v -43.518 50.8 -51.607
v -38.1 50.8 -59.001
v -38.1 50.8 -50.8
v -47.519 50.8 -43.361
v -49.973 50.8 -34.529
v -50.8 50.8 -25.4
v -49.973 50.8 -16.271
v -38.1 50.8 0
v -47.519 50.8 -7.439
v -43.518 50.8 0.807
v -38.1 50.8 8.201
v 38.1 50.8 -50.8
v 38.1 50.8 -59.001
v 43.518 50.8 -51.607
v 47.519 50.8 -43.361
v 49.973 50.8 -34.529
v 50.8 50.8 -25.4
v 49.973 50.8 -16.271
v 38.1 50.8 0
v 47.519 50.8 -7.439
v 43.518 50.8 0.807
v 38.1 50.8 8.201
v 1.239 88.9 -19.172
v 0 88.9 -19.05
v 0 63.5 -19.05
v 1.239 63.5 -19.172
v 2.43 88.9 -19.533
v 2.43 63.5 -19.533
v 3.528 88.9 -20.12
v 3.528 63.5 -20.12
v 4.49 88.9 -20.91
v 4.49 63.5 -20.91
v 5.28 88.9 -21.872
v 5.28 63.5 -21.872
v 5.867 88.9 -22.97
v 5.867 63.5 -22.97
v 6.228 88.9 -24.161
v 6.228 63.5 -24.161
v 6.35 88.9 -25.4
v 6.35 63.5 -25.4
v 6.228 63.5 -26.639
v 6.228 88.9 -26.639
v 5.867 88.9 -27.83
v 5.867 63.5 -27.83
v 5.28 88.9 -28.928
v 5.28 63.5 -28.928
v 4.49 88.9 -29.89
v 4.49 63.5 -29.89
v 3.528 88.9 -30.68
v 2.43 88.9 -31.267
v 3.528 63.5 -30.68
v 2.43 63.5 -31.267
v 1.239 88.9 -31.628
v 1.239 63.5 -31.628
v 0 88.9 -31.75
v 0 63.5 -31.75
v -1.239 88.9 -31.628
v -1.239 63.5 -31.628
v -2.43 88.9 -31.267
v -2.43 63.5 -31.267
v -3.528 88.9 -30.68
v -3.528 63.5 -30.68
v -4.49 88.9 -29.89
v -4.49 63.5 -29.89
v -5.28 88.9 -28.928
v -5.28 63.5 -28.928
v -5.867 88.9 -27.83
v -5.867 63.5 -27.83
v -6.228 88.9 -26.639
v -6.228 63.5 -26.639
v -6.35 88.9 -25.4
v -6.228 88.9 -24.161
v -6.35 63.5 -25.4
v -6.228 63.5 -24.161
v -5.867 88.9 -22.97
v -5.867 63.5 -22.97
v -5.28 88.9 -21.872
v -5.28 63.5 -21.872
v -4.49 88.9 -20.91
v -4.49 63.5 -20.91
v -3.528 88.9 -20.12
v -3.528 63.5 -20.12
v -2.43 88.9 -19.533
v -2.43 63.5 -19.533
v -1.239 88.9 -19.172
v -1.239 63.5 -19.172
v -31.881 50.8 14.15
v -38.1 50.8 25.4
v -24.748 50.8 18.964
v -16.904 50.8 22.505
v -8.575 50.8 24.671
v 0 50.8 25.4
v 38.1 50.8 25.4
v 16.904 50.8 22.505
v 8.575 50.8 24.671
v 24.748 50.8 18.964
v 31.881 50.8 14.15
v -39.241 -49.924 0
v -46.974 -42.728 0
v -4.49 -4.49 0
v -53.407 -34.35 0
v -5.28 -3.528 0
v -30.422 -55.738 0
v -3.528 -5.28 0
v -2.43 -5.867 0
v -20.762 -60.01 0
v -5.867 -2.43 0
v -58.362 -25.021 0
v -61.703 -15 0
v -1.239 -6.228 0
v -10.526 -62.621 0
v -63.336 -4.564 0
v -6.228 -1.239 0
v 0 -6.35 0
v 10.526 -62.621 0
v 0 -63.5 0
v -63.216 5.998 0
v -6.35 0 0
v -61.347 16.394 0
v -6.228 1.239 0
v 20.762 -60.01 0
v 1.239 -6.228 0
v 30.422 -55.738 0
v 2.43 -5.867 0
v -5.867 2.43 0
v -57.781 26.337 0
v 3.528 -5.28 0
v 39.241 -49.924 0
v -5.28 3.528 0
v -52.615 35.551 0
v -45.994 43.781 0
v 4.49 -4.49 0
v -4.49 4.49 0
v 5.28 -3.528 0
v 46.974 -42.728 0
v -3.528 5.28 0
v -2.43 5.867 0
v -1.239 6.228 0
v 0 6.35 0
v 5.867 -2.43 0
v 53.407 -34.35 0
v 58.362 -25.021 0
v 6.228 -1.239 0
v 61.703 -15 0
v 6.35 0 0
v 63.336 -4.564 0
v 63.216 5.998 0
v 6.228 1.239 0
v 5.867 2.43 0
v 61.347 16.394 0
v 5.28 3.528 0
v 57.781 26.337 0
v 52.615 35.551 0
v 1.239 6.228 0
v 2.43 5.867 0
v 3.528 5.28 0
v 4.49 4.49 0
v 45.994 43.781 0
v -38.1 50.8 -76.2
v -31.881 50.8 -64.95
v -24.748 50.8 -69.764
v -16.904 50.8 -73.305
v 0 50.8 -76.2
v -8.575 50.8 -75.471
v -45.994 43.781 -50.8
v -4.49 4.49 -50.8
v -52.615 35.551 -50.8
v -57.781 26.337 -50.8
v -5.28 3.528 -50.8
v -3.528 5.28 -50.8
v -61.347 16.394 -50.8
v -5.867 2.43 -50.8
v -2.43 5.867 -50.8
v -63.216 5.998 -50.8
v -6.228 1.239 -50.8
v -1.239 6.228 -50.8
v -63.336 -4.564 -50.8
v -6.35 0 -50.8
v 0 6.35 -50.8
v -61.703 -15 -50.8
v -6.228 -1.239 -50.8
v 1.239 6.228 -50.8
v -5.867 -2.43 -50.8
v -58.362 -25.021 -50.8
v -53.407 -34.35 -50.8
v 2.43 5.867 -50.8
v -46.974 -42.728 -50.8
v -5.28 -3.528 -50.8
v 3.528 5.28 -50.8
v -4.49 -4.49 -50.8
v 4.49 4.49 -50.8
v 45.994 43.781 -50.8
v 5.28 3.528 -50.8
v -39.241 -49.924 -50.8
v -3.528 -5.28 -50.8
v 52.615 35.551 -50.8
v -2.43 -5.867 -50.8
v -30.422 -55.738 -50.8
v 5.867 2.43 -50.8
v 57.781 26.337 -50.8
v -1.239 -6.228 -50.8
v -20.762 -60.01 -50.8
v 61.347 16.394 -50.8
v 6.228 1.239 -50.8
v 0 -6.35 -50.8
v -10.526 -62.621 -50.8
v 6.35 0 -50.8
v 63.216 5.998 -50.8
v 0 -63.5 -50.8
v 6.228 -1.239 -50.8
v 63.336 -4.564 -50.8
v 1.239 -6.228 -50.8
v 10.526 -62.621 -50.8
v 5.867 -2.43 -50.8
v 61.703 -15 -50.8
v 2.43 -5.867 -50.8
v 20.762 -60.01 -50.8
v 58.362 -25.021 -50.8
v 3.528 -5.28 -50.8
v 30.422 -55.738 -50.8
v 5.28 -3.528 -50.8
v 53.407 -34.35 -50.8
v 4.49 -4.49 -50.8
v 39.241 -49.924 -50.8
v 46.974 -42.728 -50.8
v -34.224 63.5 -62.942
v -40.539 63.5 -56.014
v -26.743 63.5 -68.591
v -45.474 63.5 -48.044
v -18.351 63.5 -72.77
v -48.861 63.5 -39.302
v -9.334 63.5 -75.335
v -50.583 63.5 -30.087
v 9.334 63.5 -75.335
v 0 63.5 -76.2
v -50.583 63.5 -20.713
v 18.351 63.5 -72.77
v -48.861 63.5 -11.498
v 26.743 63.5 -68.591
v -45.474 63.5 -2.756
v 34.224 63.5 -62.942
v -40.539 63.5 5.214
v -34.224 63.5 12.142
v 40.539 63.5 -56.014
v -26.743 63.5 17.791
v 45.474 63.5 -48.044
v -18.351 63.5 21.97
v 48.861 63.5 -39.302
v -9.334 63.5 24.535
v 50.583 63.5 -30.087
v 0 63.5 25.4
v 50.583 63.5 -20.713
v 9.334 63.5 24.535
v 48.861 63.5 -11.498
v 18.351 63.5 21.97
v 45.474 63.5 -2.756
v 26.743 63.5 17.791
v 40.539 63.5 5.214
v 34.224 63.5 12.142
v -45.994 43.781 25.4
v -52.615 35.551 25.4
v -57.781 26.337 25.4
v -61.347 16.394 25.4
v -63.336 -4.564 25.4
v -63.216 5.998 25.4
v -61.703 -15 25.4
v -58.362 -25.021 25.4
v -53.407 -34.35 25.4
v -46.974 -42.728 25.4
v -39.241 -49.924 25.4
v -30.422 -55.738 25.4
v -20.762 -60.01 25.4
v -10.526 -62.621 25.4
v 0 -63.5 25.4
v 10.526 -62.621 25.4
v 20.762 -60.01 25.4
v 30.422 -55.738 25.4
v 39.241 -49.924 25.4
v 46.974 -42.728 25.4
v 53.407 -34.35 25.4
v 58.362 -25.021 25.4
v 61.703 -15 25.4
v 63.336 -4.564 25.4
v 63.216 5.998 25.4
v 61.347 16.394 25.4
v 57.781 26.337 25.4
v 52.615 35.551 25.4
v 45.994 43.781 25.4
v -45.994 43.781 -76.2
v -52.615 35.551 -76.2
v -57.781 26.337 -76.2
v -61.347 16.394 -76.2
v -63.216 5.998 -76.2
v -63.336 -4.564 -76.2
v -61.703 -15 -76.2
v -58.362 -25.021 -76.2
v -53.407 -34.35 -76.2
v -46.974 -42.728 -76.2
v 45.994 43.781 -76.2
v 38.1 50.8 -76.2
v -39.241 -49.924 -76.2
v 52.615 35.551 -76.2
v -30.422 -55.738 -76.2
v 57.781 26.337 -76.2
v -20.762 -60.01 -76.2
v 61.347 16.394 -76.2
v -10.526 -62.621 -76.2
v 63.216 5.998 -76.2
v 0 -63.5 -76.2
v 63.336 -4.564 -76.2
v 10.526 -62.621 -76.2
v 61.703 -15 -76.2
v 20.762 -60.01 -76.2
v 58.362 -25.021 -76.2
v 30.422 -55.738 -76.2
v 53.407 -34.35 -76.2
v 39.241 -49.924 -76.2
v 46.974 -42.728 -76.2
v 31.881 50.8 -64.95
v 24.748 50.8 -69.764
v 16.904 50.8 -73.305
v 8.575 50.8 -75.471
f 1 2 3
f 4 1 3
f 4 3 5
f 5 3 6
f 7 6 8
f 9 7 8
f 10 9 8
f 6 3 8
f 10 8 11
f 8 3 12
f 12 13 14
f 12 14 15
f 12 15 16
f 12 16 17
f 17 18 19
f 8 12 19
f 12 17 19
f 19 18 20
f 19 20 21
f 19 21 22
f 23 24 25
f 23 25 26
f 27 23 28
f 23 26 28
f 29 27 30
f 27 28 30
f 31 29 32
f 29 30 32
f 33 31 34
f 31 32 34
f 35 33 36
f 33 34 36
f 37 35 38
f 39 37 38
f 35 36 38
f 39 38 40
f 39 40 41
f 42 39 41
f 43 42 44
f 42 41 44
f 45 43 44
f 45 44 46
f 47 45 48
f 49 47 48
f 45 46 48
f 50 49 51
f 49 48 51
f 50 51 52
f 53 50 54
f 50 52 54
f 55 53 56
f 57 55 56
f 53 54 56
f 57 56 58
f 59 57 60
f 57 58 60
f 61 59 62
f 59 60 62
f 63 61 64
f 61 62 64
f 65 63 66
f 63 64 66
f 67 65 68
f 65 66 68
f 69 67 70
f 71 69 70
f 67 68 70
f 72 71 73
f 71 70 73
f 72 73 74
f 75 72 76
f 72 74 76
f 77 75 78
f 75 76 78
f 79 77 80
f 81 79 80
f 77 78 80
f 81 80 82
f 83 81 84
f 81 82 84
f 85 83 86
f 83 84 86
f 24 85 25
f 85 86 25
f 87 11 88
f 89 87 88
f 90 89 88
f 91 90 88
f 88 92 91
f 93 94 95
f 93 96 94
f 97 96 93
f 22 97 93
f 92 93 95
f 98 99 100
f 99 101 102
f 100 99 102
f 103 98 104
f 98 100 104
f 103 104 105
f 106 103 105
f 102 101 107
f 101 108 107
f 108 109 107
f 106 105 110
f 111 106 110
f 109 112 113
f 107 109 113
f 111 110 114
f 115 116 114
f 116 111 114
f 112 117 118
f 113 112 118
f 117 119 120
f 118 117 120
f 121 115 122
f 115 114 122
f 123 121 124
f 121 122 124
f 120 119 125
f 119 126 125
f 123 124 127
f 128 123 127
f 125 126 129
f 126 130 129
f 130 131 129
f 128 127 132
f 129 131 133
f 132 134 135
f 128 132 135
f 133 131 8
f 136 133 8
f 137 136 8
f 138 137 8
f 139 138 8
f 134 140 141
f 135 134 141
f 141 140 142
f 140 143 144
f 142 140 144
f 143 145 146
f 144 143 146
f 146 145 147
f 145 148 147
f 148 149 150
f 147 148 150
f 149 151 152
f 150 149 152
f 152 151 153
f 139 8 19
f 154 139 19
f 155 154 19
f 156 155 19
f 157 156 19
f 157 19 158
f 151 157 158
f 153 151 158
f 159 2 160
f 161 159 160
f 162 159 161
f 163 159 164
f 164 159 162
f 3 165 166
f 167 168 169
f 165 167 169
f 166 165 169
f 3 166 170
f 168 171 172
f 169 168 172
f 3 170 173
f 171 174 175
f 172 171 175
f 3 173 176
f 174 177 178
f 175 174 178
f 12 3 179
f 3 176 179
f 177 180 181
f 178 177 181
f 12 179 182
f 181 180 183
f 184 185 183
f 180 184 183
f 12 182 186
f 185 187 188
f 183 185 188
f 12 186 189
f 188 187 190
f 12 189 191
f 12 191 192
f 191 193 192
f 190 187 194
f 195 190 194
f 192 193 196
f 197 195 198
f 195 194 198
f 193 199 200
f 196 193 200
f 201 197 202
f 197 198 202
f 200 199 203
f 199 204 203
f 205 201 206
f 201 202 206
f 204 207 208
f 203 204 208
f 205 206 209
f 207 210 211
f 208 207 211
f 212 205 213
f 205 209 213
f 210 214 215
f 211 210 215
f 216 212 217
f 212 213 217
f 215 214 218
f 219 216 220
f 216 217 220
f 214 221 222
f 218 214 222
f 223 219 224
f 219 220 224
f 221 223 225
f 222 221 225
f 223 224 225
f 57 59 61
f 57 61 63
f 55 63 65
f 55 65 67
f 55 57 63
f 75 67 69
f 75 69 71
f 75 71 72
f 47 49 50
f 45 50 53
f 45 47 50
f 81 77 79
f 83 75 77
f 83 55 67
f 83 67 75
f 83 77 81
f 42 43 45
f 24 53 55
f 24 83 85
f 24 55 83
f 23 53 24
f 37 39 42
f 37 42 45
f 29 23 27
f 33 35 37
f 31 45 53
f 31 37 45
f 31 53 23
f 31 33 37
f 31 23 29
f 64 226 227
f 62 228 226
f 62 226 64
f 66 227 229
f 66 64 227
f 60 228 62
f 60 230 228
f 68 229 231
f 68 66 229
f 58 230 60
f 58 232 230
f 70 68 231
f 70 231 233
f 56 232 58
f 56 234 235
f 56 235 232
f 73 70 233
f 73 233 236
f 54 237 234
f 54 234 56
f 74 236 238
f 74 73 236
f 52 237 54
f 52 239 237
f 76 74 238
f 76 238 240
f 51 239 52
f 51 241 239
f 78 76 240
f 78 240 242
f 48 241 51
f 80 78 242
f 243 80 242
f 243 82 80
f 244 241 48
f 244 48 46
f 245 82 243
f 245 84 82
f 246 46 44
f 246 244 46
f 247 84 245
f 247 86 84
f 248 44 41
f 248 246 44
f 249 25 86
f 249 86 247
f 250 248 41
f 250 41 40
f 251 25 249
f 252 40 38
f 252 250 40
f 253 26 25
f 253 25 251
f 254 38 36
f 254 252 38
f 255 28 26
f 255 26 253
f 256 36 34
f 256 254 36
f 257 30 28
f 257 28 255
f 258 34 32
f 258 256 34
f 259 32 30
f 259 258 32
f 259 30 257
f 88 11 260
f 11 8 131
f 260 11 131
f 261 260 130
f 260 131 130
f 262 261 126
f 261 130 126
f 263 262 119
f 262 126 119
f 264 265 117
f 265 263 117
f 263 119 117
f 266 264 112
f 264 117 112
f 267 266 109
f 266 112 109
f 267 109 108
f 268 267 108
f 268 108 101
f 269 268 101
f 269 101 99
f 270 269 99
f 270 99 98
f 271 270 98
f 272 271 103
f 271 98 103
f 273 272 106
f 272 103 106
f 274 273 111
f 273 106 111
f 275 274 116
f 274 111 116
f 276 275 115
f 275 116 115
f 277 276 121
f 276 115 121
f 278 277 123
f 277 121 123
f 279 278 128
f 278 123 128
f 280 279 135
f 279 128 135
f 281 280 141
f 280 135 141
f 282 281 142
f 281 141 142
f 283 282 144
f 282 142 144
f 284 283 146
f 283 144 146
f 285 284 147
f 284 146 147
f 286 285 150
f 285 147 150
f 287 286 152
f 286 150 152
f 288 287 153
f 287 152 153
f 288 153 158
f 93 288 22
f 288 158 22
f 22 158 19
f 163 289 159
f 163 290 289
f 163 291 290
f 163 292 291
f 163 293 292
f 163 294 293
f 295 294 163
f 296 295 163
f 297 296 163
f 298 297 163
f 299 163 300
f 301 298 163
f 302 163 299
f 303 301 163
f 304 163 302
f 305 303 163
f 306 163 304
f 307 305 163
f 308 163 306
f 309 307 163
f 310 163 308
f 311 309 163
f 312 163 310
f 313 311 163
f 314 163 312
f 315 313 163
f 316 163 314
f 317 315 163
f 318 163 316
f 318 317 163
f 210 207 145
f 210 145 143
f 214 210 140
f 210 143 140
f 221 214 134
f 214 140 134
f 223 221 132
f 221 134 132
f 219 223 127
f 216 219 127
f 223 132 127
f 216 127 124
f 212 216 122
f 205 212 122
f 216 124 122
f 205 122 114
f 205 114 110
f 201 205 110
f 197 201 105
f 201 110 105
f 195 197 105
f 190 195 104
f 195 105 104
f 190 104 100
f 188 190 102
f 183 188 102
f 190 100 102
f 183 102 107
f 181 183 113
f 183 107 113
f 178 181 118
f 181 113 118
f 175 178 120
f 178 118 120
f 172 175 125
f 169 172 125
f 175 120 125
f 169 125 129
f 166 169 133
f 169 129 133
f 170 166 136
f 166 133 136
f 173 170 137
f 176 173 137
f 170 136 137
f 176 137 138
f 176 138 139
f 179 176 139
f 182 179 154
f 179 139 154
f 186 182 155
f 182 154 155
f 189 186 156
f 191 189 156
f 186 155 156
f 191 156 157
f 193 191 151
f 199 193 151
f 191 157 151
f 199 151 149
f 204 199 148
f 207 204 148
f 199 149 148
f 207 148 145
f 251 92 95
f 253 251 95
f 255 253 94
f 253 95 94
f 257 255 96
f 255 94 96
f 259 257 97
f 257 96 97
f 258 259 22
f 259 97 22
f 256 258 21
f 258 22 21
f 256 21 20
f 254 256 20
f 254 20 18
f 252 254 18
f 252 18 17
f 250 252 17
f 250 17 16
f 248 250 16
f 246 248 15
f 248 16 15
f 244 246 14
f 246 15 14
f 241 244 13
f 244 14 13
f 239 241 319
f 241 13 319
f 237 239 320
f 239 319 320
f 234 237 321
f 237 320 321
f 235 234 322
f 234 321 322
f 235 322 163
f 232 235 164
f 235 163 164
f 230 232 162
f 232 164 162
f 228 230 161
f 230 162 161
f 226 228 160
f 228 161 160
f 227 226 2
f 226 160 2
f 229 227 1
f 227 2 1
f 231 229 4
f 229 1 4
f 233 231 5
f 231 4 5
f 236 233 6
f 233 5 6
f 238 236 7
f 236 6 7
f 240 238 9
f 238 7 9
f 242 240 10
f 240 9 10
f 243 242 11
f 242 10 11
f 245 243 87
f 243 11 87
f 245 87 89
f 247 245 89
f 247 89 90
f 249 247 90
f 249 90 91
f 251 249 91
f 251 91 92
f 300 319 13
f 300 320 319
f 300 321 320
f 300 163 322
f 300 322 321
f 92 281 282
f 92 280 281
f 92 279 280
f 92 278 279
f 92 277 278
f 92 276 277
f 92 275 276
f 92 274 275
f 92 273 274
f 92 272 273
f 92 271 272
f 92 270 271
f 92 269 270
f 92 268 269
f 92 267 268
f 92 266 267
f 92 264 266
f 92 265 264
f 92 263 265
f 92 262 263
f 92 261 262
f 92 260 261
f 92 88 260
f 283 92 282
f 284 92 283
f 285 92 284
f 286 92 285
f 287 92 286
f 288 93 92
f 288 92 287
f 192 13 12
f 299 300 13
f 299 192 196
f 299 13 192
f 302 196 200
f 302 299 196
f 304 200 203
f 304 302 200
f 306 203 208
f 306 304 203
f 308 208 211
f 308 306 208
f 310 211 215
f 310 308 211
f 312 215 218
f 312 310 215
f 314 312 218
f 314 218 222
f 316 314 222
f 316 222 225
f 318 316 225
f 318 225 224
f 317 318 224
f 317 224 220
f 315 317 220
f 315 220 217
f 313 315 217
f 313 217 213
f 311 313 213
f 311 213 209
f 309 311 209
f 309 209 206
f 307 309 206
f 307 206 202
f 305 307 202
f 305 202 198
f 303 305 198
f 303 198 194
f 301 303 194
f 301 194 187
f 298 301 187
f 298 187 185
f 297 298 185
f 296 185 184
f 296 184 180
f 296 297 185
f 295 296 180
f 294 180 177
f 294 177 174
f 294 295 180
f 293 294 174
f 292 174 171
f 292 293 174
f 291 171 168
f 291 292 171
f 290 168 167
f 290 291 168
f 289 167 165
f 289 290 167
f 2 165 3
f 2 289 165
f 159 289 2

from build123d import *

# Parameters (mm, degrees)
SKETCH1_R           = 63.5
BOSS_EXTRUDE2_DEPTH = 25.4
SKETCH2_R           = 6.35
BOSS_EXTRUDE3_DEPTH = 50.8
BOSS_EXTRUDE4_START = 25.4
SKETCH3_R           = 63.5
BOSS_EXTRUDE4_DEPTH = 25.4
CUT_EXTRUDE2_START  = 50.8
SKETCH4_W           = 127
SKETCH4_H           = 101.6
CUT_EXTRUDE2_DEPTH  = 76.2
SKETCH5_R           = 50.8
BOSS_EXTRUDE5_DEPTH = 12.7
SKETCH6_R           = 6.35
BOSS_EXTRUDE6_DEPTH = 25.4


with BuildPart() as part:
    # Sketch1 → Boss-Extrude2 (new body)
    with BuildSketch(Plane.XY):
        Circle(SKETCH1_R)
    extrude(amount=BOSS_EXTRUDE2_DEPTH)

    # Sketch2 → Boss-Extrude3 (add)
    with BuildSketch(Plane(origin=(0, 0, 0), x_dir=(-1, 0, 0), z_dir=(0, 0, -1))):
        with Locations(Location((0, 0, 0), (0, 0, 180))):
            Circle(SKETCH2_R)
    extrude(amount=BOSS_EXTRUDE3_DEPTH)

    # Sketch3 → Boss-Extrude4 (add)
    with BuildSketch(Plane(origin=(0, 0, -50.8), x_dir=(-1, 0, 0), z_dir=(0, 0, -1)).offset(BOSS_EXTRUDE4_START)):
        with Locations(Location((0, 0, 0), (0, 0, 180))):
            Circle(SKETCH3_R)
    extrude(amount=-BOSS_EXTRUDE4_DEPTH)

    # Sketch4 → Cut-Extrude2 (cut)
    with BuildSketch(Plane(origin=(0, 0, 0), x_dir=(1, 0, 0), z_dir=(0, 1, 0)).offset(CUT_EXTRUDE2_START)):
        with Locations((0, 25.4)):
            Rectangle(SKETCH4_W, SKETCH4_H)
    extrude(amount=CUT_EXTRUDE2_DEPTH, mode=Mode.SUBTRACT)

    # Sketch5 → Boss-Extrude5 (add)
    with BuildSketch(Plane(origin=(0, 50.8, 0), x_dir=(1, 0, 0), z_dir=(0, 1, 0))):
        with Locations(Location((0, 25.4, 0), (0, 0, 270))):
            Circle(SKETCH5_R)
    extrude(amount=BOSS_EXTRUDE5_DEPTH)

    # Sketch6 → Boss-Extrude6 (add)
    with BuildSketch(Plane(origin=(0, 63.5, 0), x_dir=(1, 0, 0), z_dir=(0, 1, 0))):
        with Locations(Location((0, 25.4, 0), (0, 0, 270))):
            Circle(SKETCH6_R)
    extrude(amount=BOSS_EXTRUDE6_DEPTH)


solid = part.part
